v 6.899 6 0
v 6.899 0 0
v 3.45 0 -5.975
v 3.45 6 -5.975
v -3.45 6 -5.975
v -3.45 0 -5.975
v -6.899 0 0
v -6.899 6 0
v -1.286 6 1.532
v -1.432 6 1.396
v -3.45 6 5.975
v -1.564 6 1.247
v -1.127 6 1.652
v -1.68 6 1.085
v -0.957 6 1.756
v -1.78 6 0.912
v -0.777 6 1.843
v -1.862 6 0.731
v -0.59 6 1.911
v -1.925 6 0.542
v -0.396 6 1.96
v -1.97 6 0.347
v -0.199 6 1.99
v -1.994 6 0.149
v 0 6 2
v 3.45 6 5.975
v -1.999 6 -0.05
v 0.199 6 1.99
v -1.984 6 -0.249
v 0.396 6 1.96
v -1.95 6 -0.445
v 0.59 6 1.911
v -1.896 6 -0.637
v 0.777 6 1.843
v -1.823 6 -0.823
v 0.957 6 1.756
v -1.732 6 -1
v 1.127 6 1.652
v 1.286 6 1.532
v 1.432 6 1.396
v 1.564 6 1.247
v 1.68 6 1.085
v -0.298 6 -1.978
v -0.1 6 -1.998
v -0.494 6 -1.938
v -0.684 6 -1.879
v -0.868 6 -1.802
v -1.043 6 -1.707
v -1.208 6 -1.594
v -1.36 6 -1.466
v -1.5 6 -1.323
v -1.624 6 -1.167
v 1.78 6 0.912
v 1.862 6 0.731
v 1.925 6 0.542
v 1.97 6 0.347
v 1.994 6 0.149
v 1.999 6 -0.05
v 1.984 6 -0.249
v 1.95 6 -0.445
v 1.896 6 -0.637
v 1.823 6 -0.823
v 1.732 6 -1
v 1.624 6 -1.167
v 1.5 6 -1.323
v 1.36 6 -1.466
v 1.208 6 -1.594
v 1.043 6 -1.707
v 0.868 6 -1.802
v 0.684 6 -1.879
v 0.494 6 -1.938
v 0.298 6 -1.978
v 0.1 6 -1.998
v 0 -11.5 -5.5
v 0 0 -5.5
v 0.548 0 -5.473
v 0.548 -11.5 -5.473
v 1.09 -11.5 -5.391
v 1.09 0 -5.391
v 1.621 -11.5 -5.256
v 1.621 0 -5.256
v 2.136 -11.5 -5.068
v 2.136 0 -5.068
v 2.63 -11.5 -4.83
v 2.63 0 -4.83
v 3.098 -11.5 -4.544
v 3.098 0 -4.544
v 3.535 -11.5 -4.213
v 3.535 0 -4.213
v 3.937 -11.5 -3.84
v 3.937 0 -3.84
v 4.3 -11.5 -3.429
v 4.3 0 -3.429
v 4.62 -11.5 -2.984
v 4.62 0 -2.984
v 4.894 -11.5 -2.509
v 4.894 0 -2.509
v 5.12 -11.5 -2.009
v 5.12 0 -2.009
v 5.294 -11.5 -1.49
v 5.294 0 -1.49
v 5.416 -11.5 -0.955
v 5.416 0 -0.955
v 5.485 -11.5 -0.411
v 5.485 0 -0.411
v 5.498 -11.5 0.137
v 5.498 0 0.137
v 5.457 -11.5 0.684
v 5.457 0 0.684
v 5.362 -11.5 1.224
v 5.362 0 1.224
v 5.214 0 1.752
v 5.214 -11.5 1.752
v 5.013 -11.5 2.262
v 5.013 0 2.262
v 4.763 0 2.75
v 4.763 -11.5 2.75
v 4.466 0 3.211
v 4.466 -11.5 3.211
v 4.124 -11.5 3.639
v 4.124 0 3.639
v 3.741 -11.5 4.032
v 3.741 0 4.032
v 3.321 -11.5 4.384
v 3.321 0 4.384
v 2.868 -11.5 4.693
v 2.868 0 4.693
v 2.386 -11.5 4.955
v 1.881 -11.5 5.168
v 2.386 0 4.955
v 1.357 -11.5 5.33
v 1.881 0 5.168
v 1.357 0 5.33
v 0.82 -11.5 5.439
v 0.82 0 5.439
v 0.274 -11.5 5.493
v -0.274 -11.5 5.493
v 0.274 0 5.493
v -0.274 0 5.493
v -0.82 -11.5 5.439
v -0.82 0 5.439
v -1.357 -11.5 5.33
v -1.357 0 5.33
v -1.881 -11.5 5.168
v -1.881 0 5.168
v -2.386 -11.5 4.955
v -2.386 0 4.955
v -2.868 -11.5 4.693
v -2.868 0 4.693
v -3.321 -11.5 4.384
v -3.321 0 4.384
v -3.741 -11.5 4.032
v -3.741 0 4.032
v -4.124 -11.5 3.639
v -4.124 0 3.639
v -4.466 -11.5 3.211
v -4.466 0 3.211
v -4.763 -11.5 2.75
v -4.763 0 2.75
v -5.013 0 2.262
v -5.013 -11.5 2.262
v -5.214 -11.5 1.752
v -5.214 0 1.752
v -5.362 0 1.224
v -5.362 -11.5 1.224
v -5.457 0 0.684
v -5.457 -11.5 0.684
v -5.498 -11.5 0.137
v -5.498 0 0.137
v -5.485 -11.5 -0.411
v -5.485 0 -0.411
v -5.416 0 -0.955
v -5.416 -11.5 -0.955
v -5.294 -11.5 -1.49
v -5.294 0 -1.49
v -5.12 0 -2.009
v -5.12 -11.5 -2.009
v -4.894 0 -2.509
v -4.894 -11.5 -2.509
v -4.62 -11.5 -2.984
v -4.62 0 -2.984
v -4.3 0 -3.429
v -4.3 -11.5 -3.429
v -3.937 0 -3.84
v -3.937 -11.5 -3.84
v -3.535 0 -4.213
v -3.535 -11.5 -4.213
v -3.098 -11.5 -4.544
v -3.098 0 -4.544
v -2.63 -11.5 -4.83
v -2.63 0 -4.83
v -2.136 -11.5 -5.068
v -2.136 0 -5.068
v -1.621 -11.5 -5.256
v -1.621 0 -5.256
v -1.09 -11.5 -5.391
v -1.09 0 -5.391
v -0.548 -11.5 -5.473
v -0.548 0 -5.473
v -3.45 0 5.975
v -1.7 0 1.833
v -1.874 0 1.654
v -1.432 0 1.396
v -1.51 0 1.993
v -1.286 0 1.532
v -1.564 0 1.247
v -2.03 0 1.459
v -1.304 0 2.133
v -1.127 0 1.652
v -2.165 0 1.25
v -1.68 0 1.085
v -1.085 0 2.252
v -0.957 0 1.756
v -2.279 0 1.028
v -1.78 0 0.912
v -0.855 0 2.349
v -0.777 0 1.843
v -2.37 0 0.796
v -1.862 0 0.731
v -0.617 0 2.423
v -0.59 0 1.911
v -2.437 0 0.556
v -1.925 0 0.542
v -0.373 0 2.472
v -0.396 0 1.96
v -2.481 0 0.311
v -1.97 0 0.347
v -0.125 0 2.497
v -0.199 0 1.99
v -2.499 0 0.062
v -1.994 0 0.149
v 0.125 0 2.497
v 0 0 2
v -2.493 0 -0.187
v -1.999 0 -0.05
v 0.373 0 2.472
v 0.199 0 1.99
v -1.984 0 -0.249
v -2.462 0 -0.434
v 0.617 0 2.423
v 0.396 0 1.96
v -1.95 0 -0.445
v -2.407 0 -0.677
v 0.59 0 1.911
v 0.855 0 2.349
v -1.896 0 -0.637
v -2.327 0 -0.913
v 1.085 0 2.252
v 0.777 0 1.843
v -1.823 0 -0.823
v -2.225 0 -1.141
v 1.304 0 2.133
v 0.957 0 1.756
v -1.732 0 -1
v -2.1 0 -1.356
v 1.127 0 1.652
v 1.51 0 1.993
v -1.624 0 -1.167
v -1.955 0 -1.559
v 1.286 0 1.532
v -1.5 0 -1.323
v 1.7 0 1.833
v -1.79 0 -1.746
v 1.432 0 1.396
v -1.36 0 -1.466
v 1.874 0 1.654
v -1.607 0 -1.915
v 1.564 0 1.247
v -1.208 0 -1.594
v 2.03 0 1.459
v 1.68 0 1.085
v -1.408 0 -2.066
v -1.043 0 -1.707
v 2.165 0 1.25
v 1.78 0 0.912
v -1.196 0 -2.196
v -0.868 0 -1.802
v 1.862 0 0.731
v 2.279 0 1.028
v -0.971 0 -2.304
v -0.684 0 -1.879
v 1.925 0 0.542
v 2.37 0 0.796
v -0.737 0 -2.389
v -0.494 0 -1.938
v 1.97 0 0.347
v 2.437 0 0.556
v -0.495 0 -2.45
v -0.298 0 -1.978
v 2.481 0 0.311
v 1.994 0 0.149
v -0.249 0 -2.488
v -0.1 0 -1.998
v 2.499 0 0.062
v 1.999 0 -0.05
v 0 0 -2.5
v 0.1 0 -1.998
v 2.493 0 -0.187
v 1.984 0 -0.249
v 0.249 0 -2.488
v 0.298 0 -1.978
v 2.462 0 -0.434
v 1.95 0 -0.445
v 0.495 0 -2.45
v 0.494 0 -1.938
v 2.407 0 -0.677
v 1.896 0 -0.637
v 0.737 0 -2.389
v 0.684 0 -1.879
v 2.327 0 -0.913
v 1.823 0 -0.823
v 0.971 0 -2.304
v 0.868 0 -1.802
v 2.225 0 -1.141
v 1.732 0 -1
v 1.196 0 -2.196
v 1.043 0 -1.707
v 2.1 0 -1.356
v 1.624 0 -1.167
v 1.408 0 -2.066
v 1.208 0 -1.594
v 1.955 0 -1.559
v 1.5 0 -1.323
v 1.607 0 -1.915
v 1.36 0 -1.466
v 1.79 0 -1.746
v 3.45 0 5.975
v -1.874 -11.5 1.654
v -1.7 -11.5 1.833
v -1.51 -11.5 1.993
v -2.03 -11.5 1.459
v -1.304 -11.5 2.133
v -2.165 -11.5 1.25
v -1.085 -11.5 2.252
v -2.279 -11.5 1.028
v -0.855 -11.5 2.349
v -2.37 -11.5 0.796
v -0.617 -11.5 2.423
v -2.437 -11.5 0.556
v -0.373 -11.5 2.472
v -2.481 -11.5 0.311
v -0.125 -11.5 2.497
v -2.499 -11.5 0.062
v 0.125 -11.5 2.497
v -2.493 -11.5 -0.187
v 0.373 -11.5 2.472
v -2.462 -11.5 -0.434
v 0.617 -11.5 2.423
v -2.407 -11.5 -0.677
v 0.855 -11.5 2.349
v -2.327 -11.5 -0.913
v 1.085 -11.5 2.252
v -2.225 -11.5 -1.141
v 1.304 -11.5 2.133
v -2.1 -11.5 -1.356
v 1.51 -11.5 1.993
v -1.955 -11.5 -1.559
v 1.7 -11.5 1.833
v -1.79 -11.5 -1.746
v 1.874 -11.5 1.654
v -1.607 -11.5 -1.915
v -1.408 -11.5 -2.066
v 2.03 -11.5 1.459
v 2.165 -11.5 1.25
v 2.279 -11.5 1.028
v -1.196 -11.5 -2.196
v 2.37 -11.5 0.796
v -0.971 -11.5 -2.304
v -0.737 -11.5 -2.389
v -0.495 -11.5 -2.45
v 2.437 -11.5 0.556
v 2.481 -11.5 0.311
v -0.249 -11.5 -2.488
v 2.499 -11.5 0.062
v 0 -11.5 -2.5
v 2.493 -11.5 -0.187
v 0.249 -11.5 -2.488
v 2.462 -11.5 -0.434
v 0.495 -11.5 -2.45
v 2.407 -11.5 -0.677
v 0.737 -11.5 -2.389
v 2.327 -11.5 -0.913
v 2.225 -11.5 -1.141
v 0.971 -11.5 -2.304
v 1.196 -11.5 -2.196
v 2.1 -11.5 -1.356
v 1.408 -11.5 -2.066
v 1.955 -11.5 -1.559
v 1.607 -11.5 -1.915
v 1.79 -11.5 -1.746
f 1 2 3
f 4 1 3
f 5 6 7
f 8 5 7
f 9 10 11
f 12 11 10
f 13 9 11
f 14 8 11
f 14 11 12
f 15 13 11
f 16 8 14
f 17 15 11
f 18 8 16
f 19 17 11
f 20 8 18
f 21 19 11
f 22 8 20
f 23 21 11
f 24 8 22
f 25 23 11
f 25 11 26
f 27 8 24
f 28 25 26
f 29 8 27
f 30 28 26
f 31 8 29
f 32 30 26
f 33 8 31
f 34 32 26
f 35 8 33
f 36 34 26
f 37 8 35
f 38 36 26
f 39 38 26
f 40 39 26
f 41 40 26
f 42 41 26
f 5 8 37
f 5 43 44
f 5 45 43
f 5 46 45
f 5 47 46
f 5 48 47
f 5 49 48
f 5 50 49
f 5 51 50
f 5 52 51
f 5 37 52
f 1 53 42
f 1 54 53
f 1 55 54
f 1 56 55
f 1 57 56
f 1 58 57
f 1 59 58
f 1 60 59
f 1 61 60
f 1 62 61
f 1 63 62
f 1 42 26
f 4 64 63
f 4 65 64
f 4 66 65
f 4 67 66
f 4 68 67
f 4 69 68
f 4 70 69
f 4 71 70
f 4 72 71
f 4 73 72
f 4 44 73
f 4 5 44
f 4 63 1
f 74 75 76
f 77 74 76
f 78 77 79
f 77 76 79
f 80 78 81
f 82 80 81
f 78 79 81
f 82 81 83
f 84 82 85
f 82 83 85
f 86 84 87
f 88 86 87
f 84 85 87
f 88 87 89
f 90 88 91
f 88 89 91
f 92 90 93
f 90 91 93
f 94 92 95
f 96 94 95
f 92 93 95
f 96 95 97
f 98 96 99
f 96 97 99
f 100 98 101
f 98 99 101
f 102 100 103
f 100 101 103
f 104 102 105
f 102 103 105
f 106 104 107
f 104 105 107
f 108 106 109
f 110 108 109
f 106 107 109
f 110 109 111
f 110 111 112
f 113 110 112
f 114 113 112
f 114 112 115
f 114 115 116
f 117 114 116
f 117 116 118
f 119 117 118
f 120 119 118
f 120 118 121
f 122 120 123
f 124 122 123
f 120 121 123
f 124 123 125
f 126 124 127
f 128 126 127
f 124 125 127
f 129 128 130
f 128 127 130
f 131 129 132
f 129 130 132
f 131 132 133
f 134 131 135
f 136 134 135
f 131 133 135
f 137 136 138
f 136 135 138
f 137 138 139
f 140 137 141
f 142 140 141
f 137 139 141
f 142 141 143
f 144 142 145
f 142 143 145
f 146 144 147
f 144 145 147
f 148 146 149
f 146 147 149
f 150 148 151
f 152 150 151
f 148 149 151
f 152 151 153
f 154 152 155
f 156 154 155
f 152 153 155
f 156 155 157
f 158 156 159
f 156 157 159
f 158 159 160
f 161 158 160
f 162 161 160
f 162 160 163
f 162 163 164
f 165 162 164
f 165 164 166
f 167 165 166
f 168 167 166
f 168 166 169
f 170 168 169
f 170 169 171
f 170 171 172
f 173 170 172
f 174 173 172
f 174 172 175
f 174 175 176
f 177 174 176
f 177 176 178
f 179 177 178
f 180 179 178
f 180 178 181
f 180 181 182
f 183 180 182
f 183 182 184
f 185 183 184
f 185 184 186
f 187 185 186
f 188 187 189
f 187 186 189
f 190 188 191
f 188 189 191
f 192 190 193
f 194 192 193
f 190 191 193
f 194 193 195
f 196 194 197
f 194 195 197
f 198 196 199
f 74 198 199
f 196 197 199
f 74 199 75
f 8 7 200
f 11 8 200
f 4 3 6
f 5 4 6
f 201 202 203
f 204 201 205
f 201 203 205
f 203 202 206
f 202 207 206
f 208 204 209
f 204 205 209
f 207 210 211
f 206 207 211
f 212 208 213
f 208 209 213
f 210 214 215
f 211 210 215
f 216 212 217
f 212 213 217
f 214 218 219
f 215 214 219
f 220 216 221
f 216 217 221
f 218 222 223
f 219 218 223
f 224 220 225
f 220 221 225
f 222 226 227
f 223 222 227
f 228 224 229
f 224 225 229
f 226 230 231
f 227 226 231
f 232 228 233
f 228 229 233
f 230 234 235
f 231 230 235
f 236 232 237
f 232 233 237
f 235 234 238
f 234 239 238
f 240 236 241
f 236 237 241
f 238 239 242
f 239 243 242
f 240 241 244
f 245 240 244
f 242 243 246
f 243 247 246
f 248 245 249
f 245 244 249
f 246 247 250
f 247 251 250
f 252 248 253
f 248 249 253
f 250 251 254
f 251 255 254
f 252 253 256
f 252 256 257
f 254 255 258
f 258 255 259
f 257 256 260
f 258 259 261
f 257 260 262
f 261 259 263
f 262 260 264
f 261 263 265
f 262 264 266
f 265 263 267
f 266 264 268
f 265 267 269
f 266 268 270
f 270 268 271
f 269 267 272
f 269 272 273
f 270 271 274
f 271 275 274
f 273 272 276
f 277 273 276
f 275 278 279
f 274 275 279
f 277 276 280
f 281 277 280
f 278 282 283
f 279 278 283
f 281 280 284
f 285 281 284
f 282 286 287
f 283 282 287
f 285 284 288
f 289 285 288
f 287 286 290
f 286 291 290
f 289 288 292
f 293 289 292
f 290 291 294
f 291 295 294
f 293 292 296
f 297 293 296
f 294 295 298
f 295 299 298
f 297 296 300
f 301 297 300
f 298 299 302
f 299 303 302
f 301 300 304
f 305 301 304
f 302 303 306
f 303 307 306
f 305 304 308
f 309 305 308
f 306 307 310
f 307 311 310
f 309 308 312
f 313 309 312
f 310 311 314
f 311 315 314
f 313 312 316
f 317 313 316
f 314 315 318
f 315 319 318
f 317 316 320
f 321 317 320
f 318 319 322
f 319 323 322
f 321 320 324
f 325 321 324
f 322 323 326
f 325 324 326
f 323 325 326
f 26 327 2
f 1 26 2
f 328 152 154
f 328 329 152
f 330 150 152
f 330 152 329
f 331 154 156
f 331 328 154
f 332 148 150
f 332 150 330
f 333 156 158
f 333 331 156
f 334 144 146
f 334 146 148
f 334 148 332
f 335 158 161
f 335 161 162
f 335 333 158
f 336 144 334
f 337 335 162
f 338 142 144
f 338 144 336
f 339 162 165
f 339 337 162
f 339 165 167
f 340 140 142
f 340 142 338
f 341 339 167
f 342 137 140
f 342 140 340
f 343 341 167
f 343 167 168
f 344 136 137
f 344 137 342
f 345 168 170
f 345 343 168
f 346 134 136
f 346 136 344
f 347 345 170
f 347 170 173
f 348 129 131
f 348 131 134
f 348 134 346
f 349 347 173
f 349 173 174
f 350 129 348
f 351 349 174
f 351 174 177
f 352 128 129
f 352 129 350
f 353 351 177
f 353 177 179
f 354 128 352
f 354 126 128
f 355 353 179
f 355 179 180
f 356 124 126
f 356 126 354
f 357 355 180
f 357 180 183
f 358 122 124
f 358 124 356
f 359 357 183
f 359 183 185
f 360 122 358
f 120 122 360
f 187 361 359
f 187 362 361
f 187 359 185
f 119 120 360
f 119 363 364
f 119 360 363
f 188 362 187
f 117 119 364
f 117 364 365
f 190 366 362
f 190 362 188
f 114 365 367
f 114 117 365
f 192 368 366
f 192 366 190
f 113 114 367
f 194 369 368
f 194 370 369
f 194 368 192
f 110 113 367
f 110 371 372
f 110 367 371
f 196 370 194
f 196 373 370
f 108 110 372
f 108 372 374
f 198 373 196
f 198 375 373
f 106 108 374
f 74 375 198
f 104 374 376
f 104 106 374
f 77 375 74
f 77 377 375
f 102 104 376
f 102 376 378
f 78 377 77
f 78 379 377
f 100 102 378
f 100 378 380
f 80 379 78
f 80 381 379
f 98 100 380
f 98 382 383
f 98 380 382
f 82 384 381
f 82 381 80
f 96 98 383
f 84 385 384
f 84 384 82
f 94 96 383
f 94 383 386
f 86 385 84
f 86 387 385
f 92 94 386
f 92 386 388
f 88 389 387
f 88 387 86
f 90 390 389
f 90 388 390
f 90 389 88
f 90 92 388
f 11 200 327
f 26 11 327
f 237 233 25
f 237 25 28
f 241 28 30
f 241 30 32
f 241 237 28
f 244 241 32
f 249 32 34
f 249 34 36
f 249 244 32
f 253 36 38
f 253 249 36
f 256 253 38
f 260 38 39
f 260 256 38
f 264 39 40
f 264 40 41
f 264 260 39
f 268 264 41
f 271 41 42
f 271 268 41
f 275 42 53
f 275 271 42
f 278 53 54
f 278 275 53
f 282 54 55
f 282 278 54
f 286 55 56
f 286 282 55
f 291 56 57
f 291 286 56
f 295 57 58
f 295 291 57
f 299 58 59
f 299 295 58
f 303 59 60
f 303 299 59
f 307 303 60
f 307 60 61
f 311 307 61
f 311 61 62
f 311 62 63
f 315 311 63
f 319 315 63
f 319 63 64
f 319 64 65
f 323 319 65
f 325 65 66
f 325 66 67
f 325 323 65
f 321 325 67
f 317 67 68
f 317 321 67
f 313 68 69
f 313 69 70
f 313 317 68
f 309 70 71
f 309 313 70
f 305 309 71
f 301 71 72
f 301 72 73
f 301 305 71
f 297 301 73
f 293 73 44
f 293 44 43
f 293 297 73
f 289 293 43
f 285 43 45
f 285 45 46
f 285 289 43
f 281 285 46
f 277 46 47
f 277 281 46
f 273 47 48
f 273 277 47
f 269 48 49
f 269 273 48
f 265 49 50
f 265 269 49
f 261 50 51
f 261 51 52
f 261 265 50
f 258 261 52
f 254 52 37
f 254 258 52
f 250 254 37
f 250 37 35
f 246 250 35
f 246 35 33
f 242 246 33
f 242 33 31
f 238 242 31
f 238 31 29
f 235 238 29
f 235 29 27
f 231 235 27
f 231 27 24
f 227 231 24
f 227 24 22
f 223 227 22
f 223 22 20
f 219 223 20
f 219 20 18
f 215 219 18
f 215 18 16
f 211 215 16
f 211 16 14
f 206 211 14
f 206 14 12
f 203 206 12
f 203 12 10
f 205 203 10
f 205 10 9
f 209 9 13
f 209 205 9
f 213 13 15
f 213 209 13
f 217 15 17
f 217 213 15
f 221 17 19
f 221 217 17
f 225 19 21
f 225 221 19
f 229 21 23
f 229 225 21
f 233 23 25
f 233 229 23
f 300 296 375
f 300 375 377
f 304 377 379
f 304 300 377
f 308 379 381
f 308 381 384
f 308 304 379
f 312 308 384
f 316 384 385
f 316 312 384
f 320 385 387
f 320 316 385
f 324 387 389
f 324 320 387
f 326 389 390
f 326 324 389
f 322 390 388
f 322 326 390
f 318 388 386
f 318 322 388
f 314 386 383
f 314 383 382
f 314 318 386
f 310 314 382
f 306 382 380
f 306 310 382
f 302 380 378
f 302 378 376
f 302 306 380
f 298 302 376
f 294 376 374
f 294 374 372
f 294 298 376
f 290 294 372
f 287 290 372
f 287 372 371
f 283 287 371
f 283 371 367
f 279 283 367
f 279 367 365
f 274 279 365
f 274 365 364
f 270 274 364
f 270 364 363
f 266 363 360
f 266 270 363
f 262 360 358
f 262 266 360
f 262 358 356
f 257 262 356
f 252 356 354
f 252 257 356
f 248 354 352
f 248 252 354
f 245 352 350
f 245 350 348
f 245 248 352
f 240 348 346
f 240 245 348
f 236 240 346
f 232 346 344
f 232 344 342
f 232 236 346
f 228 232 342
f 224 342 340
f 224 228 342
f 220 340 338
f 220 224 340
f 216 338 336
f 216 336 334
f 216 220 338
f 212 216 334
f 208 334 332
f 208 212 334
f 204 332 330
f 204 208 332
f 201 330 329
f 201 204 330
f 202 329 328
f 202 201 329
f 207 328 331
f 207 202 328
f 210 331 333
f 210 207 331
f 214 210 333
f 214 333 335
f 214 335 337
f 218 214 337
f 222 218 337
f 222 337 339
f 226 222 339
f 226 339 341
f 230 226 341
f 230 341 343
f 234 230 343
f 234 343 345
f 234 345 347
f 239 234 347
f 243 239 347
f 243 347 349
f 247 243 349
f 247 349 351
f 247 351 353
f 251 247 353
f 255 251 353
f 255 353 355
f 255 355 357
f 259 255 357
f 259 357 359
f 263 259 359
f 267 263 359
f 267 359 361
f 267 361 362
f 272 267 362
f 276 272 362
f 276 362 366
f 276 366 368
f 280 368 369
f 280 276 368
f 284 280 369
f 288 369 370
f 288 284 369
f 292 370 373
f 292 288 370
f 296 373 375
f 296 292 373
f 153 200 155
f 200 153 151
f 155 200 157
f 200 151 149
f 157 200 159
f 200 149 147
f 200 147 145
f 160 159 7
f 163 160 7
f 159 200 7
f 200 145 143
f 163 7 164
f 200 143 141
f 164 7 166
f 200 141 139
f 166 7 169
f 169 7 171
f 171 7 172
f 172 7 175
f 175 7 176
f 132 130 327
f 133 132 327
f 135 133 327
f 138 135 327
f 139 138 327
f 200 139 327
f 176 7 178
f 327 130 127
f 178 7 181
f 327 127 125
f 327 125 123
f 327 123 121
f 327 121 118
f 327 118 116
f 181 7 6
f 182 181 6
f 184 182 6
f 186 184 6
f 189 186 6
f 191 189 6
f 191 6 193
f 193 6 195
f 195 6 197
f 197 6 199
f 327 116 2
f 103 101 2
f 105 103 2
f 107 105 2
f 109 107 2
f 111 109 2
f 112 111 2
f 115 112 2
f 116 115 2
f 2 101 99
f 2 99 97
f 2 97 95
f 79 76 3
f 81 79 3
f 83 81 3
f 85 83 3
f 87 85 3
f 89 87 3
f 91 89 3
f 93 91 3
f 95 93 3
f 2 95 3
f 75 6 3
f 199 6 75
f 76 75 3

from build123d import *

# Parameters (mm, degrees)
SKETCH_1_R      = 2
EXTRUDE_1_DEPTH = 6
SKETCH_2_R      = 5.5
SKETCH_2_R_2    = 2.5
EXTRUDE_2_DEPTH = 11.5


with BuildPart() as part:
    # 草图1 → 凸台-拉伸1 (new body)
    with BuildSketch(Plane(origin=(0, 0, 0), x_dir=(1, 0, 0), z_dir=(0, 1, 0))):
        Polygon((6.899335717, 0), (3.449667858, 5.975), (-3.449667858, 5.975), (-6.899335717, 0), (-3.449667858, -5.975), (3.449667858, -5.975), align=None)
        with Locations(Location((0, 0, 0), (0, 0, 270))):
            Circle(SKETCH_1_R, mode=Mode.SUBTRACT)
    extrude(amount=EXTRUDE_1_DEPTH)

    # 草图2 → 凸台-拉伸2 (add)
    with BuildSketch(Plane.XZ):
        with Locations(Location((0, 0, 0), (0, 0, 270))):
            Circle(SKETCH_2_R)
        with Locations(Location((0, 0, 0), (0, 0, 270))):
            Circle(SKETCH_2_R_2, mode=Mode.SUBTRACT)
    extrude(amount=EXTRUDE_2_DEPTH)


solid = part.part
